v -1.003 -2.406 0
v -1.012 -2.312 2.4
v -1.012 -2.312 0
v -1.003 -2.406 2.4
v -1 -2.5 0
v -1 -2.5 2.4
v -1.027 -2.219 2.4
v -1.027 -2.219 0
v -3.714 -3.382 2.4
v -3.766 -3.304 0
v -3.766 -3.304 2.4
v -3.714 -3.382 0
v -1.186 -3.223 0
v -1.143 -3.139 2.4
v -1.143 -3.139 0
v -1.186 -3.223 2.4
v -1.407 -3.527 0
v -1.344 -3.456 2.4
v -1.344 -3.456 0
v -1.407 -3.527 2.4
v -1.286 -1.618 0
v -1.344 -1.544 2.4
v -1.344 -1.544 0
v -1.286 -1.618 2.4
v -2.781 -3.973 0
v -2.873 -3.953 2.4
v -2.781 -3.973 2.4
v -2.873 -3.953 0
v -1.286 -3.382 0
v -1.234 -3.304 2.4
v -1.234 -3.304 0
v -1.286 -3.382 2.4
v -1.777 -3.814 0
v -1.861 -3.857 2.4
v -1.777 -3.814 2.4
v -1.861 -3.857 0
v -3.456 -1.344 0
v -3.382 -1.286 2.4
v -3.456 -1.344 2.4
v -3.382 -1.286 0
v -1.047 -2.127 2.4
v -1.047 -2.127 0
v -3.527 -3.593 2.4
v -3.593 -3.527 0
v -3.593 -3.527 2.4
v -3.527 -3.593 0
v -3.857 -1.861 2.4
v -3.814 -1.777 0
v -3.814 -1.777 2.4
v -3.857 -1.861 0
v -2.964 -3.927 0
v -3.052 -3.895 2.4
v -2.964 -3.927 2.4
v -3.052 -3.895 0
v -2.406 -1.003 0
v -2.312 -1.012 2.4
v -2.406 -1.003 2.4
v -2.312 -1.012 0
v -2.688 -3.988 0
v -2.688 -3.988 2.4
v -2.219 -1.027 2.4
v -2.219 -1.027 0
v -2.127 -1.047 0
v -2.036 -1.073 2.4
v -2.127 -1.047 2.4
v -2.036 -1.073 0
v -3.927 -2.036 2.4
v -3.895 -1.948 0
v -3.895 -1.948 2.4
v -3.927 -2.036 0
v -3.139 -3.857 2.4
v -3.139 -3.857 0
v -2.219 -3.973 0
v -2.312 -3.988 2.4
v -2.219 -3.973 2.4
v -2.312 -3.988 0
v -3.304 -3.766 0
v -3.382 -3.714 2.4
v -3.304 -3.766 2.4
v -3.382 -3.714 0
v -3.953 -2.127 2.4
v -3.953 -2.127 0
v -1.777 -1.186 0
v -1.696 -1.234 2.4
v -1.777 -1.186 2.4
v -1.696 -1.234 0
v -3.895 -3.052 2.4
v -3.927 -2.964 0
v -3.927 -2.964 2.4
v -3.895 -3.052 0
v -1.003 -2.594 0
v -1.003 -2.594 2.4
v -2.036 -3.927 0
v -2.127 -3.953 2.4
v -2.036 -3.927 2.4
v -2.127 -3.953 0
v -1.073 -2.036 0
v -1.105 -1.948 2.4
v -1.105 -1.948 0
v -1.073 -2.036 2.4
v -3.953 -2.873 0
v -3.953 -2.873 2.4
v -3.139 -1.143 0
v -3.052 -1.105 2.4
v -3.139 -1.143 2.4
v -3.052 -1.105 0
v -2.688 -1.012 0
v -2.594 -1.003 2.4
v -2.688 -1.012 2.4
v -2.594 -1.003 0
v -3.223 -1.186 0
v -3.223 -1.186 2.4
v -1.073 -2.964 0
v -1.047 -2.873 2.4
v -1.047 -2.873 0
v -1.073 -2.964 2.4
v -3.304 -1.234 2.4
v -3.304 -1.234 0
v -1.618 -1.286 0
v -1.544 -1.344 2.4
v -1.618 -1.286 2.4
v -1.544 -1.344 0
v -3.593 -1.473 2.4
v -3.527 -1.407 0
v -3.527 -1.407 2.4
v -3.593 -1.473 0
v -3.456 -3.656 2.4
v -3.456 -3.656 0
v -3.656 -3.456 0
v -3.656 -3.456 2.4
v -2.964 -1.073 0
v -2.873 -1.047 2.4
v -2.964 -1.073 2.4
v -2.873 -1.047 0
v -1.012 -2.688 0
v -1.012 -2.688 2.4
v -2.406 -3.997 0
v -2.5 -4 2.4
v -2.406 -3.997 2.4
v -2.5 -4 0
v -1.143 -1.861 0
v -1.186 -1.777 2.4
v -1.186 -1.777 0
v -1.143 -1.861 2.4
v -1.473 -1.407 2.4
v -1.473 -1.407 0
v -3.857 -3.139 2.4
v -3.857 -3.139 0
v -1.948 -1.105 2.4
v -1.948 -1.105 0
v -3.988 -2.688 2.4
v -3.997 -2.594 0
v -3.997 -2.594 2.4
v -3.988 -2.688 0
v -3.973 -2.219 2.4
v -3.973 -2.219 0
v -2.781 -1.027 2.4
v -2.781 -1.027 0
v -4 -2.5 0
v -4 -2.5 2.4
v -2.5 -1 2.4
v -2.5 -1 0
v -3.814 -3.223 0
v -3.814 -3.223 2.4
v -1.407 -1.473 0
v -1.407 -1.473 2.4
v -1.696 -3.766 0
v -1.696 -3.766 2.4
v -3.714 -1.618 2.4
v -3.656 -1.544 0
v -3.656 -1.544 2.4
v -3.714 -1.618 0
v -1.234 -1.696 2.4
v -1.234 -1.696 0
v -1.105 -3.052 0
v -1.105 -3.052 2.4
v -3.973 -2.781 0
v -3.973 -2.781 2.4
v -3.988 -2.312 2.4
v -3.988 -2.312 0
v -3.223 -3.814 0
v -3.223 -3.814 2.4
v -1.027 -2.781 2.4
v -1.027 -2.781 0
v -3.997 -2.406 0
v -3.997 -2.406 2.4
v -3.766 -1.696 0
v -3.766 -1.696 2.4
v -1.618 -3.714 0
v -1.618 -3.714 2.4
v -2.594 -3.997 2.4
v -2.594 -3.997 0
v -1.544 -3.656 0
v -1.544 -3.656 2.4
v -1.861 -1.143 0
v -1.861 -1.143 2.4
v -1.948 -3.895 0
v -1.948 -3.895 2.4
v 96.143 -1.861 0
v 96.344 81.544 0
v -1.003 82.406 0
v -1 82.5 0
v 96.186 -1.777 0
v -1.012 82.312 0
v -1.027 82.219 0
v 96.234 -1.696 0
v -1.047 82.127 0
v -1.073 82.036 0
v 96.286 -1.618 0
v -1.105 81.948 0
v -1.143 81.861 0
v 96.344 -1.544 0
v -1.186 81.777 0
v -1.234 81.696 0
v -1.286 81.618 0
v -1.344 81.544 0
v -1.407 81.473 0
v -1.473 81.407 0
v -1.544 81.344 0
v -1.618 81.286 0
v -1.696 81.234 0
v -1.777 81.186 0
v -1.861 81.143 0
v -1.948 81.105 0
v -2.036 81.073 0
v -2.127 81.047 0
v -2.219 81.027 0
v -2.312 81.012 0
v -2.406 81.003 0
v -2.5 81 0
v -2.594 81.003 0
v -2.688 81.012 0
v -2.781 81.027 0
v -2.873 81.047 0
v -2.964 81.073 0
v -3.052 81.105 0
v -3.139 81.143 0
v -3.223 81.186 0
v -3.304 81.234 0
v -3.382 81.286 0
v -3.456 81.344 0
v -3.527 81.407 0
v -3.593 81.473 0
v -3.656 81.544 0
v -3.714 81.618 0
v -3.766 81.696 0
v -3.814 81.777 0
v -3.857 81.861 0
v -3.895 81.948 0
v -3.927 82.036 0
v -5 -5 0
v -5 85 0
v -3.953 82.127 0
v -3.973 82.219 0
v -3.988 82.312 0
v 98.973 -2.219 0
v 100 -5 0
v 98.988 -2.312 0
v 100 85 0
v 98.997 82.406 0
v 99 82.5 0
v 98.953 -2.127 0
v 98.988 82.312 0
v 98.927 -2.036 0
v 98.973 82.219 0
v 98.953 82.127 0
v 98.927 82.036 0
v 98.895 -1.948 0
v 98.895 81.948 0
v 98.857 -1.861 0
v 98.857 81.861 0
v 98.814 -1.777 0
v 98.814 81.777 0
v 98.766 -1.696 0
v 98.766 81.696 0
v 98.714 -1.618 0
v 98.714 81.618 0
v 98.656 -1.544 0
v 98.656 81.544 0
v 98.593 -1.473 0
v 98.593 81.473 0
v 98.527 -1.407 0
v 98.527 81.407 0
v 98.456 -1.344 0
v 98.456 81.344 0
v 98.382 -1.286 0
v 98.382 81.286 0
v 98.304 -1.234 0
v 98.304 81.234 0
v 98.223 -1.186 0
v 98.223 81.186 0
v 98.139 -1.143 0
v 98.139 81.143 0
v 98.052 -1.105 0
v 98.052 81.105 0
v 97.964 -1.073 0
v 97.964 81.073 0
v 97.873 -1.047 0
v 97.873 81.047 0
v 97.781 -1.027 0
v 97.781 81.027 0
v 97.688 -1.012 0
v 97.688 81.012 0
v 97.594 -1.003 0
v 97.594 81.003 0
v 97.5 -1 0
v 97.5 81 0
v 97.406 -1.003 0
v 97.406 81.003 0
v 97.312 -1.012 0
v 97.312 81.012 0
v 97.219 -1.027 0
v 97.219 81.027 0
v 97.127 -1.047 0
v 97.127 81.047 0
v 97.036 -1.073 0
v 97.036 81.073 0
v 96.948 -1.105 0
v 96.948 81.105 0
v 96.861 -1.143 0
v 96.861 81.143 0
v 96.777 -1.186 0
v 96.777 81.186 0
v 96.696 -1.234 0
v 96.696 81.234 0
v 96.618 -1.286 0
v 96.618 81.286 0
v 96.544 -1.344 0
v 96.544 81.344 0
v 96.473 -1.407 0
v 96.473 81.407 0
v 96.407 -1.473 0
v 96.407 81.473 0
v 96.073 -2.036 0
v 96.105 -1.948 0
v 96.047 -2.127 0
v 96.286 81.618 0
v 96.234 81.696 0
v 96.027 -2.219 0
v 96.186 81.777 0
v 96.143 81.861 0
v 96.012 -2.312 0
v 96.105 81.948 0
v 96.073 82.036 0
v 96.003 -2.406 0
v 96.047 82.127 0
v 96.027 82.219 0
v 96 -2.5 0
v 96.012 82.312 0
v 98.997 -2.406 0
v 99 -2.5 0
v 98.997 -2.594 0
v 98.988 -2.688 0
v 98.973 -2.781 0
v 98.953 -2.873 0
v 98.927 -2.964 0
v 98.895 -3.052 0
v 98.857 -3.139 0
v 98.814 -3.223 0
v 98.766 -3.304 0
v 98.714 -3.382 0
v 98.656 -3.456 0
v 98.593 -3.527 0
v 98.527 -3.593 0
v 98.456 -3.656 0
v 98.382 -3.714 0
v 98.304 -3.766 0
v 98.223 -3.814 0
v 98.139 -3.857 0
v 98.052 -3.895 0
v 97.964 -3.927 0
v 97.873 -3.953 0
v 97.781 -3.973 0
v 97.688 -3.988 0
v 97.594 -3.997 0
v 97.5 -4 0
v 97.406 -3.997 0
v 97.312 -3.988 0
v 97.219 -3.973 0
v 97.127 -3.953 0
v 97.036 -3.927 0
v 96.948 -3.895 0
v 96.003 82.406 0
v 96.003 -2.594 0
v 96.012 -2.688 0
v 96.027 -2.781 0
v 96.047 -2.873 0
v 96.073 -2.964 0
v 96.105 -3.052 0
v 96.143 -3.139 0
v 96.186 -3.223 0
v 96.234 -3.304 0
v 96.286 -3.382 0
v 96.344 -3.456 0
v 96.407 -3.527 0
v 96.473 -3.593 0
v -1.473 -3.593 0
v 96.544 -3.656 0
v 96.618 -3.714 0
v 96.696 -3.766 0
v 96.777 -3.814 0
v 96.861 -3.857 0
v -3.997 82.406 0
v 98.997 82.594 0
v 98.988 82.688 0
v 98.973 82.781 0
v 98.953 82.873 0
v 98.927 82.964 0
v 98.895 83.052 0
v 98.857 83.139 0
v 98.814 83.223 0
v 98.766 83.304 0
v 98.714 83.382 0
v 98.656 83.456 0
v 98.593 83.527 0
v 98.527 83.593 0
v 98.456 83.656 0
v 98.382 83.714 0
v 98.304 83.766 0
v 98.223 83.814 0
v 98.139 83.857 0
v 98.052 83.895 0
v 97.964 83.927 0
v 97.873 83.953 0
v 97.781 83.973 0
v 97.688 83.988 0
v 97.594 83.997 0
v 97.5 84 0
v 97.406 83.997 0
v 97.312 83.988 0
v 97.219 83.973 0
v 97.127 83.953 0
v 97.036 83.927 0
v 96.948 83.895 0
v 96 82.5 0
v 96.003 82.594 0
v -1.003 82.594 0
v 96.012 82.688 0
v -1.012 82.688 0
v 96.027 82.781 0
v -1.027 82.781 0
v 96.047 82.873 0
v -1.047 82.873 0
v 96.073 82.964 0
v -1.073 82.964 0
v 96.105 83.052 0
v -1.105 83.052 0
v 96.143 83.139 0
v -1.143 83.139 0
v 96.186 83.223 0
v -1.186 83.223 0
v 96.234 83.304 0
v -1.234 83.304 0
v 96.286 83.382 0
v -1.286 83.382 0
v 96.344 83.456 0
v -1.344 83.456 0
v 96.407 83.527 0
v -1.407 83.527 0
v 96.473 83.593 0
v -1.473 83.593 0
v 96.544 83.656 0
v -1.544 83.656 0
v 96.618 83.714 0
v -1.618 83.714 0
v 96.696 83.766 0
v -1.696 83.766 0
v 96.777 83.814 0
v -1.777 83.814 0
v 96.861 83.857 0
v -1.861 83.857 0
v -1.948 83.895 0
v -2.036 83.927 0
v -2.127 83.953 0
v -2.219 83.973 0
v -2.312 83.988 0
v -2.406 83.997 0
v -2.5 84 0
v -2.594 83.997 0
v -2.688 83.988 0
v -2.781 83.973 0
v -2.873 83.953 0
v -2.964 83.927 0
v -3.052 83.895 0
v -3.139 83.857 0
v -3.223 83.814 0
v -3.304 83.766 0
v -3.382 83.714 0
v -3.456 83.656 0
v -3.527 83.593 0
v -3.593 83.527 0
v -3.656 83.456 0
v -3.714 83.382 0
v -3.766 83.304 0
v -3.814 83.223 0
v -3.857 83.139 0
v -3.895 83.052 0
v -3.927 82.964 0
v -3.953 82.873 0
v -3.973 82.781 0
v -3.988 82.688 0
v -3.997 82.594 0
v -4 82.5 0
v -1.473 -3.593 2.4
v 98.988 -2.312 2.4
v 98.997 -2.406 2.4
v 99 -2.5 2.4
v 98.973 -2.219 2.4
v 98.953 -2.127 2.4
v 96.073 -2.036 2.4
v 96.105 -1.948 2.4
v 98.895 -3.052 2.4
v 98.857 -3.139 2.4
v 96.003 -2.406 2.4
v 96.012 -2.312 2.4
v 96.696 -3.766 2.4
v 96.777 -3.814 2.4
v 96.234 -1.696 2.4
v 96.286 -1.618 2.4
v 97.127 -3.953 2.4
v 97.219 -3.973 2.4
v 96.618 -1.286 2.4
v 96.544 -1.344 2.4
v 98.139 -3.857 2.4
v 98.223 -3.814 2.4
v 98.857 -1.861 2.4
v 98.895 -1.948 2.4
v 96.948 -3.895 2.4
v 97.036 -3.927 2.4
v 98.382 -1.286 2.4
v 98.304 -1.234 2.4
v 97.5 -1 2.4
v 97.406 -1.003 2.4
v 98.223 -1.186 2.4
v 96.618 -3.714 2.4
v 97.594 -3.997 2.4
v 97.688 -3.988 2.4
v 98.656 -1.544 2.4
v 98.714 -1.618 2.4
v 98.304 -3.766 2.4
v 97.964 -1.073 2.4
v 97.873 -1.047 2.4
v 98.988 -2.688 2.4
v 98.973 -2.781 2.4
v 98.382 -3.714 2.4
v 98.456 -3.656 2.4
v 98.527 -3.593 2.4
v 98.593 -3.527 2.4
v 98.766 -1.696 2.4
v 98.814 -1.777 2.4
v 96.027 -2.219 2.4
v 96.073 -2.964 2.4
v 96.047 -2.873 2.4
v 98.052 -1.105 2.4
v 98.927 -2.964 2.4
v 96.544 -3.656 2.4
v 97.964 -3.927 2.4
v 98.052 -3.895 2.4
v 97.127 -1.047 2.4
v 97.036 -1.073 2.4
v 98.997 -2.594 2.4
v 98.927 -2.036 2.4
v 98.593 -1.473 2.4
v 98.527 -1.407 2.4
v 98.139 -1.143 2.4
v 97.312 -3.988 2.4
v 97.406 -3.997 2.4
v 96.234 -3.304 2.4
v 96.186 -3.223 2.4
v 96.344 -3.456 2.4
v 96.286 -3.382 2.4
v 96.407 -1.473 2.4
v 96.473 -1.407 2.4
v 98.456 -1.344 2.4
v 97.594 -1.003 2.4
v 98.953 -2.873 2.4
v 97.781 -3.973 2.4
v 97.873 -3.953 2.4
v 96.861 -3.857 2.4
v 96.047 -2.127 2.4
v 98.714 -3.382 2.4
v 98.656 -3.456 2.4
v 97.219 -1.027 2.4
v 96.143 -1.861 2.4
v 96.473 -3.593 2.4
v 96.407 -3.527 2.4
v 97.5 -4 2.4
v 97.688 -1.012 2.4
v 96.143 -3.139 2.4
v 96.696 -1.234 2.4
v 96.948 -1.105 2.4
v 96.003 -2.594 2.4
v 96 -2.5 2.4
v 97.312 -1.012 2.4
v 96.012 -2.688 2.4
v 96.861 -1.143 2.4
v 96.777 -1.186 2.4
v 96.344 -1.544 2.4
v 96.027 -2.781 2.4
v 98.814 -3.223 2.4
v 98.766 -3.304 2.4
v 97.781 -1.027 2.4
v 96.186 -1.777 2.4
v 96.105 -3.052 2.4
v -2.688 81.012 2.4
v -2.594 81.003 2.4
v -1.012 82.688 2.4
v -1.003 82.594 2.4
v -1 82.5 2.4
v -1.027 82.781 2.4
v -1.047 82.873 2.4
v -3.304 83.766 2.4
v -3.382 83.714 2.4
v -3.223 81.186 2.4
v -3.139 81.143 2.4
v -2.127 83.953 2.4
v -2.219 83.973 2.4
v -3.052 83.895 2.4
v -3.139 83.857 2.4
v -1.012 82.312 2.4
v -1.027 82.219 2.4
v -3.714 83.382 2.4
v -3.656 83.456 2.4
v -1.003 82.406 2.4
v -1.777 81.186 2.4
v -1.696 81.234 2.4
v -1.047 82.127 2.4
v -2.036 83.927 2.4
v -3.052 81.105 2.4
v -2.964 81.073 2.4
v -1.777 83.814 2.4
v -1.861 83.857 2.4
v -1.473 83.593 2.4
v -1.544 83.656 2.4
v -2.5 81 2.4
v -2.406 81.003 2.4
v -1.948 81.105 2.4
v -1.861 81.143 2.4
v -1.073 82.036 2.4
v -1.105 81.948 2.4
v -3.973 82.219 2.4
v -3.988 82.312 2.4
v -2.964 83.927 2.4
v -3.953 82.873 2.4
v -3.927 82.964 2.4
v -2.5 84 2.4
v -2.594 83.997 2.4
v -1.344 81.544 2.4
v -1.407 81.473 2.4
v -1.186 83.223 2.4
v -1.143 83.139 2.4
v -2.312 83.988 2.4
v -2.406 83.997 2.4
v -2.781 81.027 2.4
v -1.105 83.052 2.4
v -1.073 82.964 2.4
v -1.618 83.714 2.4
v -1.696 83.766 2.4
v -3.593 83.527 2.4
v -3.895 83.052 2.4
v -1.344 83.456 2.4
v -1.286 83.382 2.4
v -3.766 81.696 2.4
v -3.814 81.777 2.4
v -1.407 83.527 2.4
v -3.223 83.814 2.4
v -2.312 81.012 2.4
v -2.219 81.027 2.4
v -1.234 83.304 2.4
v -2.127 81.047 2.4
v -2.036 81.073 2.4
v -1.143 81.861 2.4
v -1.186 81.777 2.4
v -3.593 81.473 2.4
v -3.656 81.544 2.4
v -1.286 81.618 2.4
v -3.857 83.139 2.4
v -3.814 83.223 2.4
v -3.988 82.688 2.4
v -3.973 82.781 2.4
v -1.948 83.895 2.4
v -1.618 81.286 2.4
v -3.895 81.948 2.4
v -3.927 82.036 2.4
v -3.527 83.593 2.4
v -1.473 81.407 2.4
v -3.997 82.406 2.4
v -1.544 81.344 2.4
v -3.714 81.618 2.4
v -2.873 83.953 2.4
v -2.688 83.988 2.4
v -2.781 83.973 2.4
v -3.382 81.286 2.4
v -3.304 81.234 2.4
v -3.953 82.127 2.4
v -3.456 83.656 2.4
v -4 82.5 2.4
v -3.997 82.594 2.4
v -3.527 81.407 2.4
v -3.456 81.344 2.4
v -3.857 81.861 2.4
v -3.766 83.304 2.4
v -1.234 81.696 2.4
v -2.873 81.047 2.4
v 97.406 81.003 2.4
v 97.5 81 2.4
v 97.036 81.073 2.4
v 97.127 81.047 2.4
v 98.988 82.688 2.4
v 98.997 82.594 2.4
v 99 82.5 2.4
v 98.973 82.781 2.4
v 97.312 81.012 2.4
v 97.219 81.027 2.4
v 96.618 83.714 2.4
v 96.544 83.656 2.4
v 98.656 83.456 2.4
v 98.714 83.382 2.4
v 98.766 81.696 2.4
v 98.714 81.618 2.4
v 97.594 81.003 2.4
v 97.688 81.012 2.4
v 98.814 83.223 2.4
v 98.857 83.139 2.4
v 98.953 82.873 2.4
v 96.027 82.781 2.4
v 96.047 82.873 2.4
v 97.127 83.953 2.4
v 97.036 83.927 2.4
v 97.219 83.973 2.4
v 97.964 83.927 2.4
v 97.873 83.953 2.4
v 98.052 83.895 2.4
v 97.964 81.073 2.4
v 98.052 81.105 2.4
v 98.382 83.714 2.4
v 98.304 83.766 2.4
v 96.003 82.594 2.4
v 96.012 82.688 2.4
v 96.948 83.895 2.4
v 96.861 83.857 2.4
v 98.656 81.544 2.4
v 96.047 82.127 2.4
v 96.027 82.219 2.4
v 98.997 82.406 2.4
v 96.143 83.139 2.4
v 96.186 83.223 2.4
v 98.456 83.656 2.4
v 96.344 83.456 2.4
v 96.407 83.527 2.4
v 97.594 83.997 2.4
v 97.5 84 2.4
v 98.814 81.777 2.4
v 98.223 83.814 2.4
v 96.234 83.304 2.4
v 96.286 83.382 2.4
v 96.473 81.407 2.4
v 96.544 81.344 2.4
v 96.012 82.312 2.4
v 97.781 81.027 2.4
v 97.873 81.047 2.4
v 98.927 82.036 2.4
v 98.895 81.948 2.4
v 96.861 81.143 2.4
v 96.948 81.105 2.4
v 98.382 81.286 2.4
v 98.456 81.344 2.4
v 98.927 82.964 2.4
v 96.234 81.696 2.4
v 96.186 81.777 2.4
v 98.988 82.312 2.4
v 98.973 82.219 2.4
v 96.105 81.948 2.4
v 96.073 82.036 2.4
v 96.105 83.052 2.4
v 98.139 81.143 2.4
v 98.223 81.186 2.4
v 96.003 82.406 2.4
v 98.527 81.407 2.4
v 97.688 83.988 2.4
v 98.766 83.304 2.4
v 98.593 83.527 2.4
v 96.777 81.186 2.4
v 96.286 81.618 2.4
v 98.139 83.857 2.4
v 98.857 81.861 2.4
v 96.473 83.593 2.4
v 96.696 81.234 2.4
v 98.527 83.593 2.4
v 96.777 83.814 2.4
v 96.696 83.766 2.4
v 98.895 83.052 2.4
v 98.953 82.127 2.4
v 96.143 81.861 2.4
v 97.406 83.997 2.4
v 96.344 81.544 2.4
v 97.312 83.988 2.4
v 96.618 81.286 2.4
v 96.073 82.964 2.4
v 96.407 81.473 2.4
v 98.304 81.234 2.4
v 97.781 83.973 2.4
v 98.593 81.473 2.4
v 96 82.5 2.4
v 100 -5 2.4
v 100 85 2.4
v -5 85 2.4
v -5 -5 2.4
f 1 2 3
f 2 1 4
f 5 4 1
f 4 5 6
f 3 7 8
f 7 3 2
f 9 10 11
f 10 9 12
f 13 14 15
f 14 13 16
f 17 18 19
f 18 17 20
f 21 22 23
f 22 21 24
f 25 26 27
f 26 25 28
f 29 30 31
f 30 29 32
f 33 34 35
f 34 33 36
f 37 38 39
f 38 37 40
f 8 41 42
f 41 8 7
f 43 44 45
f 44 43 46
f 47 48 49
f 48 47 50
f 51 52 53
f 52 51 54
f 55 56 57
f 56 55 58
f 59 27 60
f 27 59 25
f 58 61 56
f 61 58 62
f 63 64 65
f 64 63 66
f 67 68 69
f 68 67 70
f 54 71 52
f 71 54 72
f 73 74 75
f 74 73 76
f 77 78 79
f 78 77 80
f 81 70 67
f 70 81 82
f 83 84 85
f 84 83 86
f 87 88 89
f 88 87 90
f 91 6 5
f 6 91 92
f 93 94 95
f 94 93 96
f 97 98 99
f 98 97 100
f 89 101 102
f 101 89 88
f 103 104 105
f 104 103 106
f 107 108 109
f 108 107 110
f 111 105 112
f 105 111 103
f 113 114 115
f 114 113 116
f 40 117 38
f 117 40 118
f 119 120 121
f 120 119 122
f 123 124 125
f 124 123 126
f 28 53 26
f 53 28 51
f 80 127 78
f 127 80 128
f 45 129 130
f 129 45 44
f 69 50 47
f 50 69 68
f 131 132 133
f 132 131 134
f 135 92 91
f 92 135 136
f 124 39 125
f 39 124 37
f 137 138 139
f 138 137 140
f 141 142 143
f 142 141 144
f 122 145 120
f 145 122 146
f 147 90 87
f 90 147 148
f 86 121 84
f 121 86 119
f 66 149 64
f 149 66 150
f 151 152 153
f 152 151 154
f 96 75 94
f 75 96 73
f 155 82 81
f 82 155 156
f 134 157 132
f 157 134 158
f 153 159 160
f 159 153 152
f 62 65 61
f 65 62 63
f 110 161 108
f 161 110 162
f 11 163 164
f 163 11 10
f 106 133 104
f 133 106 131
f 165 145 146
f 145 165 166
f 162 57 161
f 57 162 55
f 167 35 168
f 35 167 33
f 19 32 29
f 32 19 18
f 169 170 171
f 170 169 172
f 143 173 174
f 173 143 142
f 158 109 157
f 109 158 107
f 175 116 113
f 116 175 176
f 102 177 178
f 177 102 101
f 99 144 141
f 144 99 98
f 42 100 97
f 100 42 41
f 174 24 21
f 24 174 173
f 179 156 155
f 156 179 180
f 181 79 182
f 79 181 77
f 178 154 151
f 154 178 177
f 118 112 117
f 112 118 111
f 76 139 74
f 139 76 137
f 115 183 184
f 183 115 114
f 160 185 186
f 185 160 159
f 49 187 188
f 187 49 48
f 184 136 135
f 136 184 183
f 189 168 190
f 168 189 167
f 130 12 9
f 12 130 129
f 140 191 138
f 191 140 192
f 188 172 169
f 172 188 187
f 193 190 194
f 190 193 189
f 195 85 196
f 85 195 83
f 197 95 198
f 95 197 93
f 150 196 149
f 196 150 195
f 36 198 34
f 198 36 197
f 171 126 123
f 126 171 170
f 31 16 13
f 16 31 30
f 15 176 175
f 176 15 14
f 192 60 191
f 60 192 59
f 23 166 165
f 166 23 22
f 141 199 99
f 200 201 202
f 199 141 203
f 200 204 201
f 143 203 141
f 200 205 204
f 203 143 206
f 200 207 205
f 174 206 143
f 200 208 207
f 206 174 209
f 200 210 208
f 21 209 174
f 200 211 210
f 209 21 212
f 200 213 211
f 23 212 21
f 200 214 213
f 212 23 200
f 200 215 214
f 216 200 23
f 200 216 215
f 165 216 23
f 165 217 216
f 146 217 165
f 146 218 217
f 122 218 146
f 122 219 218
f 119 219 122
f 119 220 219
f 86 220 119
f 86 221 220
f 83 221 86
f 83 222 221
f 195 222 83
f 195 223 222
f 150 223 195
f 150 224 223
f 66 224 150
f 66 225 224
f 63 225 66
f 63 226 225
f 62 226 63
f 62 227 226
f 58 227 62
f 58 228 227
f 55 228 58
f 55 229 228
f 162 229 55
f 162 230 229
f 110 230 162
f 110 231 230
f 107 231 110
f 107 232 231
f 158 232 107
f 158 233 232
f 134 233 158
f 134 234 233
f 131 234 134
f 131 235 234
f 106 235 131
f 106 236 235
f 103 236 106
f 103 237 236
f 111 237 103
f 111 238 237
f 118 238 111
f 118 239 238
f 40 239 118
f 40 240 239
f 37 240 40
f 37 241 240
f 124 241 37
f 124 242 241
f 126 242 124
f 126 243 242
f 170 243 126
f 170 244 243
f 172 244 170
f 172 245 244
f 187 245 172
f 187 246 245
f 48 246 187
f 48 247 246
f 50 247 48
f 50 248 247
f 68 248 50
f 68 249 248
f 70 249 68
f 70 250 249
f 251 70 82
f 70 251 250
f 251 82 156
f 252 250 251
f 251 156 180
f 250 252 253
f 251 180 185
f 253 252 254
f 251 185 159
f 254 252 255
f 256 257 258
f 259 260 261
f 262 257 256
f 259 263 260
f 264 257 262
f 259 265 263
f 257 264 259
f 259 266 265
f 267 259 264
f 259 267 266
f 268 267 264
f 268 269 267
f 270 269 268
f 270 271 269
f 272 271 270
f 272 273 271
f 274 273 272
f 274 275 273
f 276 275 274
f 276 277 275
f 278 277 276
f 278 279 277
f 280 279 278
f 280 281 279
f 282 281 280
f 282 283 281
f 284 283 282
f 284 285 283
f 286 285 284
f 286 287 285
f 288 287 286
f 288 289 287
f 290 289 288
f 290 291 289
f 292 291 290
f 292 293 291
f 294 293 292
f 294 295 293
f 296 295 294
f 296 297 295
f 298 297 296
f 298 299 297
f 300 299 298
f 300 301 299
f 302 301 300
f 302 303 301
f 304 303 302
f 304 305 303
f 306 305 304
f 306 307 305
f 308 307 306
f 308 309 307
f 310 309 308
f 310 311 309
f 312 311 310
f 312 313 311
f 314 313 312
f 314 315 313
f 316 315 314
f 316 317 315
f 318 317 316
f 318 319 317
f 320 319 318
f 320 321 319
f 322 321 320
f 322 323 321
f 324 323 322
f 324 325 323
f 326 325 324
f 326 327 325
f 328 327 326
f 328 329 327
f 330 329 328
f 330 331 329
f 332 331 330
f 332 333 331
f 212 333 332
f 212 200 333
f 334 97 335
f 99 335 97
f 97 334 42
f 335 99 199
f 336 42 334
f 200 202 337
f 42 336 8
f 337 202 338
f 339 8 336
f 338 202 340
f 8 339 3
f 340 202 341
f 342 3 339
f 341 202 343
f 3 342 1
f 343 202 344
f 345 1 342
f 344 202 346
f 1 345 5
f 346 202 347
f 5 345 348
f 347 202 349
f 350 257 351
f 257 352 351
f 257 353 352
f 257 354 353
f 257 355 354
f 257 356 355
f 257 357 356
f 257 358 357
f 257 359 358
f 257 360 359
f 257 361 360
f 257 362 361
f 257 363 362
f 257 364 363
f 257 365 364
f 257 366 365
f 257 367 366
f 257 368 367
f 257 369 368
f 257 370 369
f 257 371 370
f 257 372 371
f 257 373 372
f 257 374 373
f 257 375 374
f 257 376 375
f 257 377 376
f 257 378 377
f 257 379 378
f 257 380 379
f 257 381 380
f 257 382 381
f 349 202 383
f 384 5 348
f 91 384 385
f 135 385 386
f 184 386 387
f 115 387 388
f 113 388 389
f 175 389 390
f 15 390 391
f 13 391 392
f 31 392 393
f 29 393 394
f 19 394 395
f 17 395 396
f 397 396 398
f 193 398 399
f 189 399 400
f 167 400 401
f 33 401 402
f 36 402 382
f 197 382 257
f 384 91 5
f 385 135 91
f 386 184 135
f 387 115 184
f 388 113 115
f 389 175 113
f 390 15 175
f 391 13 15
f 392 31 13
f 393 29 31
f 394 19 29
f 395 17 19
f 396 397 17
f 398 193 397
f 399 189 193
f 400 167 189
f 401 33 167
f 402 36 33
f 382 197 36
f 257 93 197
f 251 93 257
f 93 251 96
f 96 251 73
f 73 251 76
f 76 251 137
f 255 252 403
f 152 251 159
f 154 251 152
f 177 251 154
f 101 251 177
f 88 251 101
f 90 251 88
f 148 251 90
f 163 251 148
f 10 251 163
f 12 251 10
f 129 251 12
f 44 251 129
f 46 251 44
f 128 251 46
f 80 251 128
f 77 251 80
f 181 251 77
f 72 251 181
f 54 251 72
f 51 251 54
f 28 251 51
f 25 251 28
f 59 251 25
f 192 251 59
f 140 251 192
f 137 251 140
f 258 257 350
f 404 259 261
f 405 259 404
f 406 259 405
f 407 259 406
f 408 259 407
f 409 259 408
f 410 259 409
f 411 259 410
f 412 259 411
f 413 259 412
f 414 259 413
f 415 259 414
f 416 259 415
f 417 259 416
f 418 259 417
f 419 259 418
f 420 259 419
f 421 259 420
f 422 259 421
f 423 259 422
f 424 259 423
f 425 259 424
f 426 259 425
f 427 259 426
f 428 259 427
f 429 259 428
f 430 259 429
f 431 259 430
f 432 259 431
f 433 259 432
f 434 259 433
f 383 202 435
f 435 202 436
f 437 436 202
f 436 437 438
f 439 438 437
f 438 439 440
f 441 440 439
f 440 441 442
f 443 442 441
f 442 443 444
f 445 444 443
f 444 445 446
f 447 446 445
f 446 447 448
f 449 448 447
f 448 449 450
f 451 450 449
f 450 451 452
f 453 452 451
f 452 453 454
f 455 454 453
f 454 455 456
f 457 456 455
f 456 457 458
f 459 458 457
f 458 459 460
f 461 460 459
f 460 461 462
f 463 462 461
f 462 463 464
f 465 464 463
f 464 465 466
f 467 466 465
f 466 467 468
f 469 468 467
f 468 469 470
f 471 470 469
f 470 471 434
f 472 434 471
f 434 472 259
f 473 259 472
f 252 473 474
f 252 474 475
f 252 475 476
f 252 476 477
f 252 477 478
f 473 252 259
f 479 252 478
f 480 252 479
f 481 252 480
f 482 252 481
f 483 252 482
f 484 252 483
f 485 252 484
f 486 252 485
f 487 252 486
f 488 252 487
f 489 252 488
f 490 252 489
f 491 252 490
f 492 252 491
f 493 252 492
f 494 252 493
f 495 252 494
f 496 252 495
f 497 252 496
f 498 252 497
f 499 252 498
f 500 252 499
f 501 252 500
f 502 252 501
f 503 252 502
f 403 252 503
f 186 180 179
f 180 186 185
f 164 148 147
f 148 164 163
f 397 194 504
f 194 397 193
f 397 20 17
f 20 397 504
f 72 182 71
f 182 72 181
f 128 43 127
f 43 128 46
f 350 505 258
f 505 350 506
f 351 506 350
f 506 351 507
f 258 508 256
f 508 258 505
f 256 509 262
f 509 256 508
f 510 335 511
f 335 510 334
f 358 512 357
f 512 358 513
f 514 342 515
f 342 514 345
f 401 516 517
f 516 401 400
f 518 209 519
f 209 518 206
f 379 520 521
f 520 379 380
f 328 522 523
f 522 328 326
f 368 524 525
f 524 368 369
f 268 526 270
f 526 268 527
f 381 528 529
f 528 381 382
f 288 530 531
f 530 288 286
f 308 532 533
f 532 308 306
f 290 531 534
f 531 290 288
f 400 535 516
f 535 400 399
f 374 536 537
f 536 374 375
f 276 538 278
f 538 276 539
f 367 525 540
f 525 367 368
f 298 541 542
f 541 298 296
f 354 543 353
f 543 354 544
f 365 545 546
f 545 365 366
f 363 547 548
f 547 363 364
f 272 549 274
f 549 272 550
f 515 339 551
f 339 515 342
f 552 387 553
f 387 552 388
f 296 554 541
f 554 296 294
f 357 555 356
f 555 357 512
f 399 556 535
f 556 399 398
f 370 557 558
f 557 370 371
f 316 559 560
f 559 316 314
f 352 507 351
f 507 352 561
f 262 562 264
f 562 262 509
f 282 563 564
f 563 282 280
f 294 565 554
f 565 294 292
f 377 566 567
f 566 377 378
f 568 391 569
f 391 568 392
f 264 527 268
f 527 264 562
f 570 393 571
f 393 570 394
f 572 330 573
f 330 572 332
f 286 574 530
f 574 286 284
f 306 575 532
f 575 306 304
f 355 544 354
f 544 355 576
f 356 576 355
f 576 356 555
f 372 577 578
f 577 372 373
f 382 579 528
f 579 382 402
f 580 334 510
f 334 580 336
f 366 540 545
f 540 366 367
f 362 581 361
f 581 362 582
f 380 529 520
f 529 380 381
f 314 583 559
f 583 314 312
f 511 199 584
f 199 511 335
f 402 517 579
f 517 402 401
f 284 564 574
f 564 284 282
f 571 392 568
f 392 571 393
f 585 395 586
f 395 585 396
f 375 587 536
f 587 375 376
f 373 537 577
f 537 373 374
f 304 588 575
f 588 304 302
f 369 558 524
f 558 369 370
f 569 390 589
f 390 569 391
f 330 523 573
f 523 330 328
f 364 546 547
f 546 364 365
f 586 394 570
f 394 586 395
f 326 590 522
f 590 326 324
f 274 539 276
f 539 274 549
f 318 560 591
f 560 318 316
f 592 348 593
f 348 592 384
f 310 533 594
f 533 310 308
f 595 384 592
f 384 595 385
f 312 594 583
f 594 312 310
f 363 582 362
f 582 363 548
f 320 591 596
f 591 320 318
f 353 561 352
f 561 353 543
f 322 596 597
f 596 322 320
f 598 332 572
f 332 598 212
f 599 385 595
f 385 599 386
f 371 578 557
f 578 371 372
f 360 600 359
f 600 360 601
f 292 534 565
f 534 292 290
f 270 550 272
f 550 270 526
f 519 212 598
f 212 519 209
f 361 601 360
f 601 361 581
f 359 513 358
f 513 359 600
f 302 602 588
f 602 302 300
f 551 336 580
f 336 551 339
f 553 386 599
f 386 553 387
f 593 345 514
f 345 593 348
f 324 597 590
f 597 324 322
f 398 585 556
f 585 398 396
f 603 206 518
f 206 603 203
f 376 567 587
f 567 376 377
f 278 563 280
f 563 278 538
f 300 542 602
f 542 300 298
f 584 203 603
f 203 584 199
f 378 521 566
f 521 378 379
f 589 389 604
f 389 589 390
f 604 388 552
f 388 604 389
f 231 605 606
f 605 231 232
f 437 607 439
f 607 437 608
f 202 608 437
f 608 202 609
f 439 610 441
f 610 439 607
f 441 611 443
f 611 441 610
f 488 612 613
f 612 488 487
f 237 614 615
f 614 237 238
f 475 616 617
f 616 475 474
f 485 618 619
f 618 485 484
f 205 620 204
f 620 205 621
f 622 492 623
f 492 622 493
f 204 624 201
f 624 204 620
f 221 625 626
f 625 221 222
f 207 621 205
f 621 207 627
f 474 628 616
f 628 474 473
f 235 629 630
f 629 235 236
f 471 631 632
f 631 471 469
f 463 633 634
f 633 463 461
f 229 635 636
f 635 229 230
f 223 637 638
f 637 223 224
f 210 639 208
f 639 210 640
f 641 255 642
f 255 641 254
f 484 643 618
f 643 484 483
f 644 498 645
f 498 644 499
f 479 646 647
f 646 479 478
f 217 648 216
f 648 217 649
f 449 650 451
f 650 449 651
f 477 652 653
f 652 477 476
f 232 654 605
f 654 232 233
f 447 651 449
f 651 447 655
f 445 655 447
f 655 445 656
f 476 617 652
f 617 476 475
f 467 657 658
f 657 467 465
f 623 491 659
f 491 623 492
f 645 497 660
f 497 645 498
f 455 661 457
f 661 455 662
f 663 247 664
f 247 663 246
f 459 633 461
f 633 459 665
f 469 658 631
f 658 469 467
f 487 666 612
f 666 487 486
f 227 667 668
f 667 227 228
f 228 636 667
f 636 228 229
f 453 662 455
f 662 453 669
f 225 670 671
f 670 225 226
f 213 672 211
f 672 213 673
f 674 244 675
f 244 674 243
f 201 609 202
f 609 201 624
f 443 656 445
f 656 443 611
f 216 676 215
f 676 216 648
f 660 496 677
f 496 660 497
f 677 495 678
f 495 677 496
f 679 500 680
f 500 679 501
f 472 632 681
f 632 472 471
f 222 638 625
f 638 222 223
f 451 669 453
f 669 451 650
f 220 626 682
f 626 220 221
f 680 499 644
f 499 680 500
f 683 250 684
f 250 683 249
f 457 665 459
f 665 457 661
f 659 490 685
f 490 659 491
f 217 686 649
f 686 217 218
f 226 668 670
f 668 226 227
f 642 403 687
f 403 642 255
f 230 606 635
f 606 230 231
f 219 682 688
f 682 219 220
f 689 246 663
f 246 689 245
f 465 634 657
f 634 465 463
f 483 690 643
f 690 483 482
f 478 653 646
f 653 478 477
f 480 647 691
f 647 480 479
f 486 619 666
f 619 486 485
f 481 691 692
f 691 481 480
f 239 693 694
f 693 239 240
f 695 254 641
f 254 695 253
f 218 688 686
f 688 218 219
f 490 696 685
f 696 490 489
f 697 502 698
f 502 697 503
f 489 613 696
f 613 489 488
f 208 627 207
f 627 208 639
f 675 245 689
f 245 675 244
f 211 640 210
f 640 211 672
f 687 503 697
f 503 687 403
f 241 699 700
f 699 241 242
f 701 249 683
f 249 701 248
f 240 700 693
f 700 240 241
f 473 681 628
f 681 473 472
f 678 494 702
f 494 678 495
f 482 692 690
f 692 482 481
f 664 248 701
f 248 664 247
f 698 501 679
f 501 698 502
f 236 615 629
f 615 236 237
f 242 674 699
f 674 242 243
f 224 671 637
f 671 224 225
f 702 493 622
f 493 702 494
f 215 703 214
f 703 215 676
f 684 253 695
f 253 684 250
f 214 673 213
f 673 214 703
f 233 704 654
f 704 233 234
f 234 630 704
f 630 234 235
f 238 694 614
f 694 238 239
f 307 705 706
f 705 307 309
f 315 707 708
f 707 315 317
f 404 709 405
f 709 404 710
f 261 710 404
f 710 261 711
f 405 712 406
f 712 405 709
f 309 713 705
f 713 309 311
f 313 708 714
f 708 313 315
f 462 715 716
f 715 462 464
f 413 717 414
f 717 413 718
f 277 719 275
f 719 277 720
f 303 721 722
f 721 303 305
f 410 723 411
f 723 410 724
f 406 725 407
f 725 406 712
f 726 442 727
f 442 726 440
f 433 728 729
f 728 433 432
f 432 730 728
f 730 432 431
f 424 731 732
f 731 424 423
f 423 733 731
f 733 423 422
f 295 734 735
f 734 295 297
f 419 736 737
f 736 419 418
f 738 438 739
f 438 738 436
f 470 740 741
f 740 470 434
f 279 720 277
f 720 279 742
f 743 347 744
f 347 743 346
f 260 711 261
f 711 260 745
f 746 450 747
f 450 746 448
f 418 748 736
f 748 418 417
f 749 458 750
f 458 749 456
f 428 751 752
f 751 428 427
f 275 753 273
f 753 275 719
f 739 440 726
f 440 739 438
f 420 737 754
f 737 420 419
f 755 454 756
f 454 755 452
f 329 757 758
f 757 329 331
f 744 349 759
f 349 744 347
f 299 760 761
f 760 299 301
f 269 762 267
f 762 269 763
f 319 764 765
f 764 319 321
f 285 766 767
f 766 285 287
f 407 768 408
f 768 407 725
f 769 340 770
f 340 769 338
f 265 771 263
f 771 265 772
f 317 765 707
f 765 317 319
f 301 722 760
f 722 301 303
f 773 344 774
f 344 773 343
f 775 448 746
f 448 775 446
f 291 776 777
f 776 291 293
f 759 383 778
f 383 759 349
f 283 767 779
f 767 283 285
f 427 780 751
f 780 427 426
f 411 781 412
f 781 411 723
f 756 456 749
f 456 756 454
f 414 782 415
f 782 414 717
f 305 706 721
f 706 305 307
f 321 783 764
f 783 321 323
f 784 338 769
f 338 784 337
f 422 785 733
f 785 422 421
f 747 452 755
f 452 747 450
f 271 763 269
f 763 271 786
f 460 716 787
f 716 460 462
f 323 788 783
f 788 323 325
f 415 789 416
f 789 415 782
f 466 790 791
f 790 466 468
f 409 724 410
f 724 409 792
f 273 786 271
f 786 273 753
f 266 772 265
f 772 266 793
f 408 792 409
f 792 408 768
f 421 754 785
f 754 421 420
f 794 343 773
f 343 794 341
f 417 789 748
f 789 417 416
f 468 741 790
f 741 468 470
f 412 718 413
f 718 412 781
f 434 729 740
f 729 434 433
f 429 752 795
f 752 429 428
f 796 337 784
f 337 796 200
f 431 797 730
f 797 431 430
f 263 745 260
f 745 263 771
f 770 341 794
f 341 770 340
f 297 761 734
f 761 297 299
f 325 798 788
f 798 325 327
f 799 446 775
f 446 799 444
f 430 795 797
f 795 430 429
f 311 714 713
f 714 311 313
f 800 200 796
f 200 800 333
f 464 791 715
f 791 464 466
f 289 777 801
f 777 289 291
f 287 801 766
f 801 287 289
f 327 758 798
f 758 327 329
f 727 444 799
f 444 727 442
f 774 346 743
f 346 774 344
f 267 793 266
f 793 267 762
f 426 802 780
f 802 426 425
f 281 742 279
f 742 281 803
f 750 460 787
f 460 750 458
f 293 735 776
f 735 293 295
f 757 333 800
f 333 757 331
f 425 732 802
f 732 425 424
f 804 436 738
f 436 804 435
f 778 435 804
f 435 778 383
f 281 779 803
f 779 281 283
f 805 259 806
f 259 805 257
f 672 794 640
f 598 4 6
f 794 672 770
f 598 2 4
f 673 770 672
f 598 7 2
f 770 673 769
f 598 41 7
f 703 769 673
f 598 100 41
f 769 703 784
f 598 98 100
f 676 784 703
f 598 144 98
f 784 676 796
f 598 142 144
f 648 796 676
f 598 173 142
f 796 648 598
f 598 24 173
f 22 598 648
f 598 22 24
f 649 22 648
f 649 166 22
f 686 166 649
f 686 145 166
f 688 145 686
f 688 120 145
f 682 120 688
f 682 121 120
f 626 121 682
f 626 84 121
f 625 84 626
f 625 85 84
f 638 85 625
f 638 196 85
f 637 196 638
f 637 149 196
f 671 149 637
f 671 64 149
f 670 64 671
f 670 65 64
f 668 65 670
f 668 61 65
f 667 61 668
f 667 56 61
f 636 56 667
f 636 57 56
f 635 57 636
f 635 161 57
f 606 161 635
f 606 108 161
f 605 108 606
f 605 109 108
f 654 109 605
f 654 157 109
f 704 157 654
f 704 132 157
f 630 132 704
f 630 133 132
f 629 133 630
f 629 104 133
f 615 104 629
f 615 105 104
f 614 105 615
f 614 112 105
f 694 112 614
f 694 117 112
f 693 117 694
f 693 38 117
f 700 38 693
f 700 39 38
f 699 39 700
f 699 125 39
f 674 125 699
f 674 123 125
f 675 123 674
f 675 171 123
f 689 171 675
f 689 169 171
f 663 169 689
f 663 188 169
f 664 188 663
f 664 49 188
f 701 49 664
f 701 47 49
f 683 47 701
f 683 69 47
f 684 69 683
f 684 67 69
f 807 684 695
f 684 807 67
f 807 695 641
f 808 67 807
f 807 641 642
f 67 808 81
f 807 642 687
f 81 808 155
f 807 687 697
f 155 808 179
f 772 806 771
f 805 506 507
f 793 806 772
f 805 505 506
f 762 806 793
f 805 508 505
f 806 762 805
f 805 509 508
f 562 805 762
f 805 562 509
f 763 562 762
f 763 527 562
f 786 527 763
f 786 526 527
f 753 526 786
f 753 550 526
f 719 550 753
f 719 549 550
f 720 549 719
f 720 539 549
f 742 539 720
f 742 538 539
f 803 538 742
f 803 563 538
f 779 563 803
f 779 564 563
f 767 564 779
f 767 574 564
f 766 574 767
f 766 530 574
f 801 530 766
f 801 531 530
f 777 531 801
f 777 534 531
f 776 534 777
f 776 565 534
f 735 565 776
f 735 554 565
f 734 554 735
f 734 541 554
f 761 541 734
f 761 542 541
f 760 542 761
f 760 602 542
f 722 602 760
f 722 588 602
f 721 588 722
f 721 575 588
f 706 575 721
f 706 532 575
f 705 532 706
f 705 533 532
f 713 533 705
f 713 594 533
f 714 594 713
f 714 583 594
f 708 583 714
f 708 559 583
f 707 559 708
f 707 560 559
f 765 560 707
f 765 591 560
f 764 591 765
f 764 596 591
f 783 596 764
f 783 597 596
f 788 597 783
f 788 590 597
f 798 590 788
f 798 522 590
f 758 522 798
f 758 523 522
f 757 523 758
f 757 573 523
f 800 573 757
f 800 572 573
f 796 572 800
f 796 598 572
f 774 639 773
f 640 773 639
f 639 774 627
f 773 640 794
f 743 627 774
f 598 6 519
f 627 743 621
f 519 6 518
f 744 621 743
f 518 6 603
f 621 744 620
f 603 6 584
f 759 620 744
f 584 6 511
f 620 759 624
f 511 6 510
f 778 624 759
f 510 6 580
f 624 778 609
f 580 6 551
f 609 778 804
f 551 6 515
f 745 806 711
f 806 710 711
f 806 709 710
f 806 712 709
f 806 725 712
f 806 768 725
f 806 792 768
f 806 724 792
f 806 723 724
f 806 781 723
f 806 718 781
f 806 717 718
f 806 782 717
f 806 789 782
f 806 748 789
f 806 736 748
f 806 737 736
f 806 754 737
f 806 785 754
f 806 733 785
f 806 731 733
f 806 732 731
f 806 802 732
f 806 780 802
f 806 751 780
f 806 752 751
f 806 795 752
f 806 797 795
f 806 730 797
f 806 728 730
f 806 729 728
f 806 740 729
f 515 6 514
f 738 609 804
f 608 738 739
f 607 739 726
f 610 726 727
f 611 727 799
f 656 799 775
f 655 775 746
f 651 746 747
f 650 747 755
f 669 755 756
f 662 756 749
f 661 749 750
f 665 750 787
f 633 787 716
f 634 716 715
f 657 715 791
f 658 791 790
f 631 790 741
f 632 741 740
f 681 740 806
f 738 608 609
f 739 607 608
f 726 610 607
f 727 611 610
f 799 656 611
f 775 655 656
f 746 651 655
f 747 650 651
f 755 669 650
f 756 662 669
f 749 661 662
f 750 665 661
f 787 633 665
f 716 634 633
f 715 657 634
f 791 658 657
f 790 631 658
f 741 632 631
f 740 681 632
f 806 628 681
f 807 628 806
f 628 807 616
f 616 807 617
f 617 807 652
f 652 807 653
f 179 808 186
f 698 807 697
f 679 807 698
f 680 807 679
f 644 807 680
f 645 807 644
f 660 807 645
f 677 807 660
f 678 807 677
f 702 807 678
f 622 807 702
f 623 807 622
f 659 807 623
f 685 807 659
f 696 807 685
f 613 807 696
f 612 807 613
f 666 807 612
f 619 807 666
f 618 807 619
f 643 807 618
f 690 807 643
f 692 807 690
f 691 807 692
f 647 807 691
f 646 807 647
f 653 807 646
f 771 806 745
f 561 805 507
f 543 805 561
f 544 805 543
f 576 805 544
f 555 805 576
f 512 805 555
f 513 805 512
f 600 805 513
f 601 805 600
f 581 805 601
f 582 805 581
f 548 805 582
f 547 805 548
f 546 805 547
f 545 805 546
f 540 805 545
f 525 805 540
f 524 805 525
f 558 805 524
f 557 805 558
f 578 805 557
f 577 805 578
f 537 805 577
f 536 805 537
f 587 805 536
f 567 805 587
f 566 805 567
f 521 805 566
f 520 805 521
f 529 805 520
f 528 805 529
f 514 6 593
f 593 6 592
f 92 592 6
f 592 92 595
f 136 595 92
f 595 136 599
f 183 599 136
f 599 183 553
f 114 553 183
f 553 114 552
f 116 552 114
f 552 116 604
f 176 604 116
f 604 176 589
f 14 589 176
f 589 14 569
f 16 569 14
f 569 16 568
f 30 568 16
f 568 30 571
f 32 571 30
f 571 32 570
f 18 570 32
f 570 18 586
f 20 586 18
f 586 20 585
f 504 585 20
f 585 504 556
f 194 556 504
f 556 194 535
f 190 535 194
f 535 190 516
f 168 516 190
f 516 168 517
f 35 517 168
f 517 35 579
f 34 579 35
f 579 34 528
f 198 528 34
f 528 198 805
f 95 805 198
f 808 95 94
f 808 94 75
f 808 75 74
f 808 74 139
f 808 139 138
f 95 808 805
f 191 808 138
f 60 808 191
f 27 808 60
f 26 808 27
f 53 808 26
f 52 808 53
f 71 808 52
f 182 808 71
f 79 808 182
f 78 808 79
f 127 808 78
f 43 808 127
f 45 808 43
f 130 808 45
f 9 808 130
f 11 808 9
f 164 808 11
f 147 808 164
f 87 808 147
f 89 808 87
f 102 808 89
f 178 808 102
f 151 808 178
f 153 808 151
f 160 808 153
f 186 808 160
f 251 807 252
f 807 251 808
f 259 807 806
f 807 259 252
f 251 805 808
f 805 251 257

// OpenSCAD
difference() {
	translate([-5, -5, 0])
		cube([105, 90, 2.4]);
	union() {
		translate([-2.5, -2.5, 0])
			cylinder(d=3, h=12.4, $fn=100);
		translate([105 -5 -2.5, -2.5, 0])
			cylinder(d=3, h=12.4, $fn=100);
		translate([-2.5, 90 -5 -2.5, 0])
			cylinder(d=3, h=12.4, $fn=100);
		translate([105 -5 -2.5, 90 -5 -2.5, 0])
			cylinder(d=3, h=12.4, $fn=100);
	}
}
